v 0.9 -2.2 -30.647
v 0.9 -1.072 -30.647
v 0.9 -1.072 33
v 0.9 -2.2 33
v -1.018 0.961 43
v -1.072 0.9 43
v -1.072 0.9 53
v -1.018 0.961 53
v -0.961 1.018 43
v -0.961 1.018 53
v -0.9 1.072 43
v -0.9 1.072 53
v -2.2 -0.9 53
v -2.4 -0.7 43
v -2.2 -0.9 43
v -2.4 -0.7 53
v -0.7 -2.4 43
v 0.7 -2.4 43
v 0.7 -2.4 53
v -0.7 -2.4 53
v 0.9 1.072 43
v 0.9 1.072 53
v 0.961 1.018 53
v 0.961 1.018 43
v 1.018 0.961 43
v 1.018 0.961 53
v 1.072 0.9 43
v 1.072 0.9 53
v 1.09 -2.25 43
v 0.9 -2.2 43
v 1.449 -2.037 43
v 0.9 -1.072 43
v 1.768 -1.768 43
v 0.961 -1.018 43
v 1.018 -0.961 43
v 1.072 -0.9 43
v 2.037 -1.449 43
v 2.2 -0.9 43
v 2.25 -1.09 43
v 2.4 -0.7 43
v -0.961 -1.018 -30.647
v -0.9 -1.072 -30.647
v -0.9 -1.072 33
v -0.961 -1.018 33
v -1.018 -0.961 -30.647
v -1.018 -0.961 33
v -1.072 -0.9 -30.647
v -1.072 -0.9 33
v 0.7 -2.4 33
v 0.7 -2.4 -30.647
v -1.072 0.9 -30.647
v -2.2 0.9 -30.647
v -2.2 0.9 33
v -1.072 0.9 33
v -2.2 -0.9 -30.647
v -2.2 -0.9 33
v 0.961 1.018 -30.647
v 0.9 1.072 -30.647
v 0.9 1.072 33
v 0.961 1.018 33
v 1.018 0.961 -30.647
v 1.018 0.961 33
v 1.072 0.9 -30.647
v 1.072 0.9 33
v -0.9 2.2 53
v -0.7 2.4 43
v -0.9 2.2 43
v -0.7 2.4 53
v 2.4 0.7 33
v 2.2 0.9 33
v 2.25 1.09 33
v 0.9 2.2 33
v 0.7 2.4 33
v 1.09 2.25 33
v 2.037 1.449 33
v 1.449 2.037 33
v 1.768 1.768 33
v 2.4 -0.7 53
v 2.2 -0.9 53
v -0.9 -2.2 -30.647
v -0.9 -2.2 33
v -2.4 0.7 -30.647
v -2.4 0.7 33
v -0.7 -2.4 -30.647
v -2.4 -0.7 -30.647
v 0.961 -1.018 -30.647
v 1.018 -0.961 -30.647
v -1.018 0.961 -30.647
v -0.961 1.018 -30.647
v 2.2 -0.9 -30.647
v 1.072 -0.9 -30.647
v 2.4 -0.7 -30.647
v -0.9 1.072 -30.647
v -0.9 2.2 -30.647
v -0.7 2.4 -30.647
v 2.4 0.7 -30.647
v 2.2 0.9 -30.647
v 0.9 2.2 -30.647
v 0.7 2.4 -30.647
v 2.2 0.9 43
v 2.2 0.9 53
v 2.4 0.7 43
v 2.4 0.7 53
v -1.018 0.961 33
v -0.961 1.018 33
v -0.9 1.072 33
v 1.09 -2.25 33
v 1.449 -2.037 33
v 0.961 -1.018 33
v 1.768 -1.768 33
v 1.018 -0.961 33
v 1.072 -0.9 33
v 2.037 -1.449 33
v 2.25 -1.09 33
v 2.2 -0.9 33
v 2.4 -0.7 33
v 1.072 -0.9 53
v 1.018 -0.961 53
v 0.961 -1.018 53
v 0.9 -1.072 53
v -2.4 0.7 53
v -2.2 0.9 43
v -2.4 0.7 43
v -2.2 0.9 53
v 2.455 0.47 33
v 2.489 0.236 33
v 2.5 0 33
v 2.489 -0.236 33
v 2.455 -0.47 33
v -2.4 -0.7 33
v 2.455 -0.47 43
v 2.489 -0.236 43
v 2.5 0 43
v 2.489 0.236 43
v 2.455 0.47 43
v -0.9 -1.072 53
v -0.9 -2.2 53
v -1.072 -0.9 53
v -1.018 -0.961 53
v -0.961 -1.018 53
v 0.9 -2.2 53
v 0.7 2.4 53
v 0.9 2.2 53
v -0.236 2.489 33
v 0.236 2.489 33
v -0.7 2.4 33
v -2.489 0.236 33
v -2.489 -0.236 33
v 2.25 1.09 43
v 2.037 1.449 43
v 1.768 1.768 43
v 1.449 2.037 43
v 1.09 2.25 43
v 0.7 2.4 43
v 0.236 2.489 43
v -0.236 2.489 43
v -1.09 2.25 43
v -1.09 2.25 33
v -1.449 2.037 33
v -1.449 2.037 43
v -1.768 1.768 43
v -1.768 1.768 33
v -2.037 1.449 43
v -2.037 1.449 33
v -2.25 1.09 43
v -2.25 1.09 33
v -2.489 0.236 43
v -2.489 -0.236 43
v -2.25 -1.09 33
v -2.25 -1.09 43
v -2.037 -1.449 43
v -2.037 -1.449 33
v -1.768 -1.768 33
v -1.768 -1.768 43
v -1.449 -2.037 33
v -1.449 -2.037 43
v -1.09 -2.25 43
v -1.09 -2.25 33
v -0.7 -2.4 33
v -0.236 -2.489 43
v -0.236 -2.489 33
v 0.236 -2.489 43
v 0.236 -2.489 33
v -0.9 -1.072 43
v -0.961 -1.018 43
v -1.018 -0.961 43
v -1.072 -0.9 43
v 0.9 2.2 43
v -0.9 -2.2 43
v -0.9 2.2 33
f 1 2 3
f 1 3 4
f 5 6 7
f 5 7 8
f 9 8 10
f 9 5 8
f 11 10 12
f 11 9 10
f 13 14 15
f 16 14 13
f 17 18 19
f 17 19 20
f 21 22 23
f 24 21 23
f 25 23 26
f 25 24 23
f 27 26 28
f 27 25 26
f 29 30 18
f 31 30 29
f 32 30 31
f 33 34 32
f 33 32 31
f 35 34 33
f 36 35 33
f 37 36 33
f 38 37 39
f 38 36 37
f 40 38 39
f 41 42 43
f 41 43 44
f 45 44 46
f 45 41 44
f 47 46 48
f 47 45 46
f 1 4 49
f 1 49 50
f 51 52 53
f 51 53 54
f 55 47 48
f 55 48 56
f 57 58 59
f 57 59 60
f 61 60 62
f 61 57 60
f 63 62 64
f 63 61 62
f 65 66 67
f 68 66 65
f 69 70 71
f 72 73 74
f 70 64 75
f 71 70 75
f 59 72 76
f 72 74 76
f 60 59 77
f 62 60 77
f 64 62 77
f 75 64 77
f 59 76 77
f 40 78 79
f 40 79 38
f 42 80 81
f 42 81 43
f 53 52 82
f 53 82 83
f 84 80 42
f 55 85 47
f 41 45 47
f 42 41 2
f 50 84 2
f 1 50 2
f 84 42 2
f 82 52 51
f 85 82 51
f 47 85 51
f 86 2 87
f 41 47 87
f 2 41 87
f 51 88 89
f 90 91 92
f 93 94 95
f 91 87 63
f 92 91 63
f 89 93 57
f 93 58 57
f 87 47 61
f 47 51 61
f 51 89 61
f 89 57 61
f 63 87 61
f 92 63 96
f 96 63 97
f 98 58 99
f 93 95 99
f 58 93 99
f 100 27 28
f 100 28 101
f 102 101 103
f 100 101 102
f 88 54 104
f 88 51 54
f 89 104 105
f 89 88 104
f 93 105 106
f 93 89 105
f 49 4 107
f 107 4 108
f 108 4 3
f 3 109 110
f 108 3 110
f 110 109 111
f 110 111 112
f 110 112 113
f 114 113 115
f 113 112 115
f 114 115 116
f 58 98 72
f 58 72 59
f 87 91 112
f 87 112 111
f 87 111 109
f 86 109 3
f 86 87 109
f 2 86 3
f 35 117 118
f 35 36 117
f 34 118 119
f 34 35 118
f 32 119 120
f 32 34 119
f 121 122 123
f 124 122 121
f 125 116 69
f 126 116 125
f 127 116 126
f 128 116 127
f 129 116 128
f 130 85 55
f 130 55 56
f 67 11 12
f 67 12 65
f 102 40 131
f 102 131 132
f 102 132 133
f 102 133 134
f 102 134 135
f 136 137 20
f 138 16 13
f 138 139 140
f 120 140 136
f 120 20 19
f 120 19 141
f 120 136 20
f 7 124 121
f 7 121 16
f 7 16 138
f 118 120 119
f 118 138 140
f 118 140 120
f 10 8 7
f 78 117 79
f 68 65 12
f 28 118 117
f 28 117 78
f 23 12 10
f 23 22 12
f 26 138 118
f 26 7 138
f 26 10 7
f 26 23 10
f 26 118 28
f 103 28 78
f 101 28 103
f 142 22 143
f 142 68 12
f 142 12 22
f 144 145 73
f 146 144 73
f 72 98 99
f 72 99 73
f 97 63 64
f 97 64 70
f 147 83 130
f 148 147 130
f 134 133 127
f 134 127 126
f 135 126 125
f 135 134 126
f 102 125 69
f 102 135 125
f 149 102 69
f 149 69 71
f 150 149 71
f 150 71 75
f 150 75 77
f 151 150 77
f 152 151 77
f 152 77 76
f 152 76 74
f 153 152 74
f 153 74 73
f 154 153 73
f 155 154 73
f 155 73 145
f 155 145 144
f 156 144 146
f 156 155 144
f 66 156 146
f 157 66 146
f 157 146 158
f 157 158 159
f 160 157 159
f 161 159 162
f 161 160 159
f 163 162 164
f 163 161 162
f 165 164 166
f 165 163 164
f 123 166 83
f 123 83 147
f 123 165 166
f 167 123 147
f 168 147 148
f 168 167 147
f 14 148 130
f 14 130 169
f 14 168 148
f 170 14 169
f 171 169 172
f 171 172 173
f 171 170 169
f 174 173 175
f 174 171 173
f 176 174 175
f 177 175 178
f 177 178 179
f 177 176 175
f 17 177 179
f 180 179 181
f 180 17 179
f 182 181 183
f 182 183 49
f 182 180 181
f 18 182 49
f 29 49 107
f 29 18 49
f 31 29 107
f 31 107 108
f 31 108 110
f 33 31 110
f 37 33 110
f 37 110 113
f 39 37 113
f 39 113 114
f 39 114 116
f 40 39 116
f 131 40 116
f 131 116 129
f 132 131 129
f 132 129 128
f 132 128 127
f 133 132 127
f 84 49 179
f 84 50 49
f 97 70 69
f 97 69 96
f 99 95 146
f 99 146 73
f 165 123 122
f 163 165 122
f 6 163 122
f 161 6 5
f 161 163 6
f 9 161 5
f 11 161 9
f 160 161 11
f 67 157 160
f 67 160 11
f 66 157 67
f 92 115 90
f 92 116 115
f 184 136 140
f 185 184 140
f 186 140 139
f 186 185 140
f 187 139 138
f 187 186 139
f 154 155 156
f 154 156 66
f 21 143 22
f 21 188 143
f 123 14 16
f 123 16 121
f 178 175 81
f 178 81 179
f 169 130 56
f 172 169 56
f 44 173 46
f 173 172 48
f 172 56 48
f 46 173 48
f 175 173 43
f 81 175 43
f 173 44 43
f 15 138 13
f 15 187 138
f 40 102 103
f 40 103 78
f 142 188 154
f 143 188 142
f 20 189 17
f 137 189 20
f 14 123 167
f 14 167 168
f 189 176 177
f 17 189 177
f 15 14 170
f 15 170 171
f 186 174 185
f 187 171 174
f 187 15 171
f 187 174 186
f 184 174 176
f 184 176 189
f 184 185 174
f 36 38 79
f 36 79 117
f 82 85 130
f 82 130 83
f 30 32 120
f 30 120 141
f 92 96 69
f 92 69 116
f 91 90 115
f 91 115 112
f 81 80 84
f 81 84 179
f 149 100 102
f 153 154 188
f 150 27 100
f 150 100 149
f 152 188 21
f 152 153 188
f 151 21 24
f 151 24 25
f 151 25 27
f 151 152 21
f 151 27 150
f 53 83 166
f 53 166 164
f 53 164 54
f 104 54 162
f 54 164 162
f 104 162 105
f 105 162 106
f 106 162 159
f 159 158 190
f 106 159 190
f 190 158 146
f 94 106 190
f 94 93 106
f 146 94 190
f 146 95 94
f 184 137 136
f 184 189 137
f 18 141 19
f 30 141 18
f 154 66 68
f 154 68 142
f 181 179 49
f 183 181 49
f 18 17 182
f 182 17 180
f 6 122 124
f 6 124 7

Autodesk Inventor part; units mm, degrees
ref_plane "YZ Plane" through (0, 0, 0) normal (1, 0, 0) x (0, 1, 0)
ref_plane "Plano de trabajo3" through (-1.1085, 1.0105, -30.6473) normal (0, 0, 1) x (1, 0, 0)
ref_plane "Plano de trabajo4" through (0, 7, 53) normal (0, 0, 1) x (-1, 0, 0)
sketch "Boceto1" plane through (0, 0, 0) normal (0, 0, 1) x (1, 0, 0)
  line L0 (0.9, -2.4) -> (-0.9, -2.4)
  line L1 (-0.9, -2.4) -> (-0.9, 2.4)
  line L2 (-0.9, 2.4) -> (0.9, 2.4)
  line L3 (0.9, 2.4) -> (0.9, -2.4)
  line L4 (0.9, -2.4) -> (-0.9, 2.4) construction
  line L5 (-0.9, -2.4) -> (0.9, 2.4) construction
  line L6 (2.4, -0.9) -> (-2.4, -0.9)
  line L7 (-2.4, -0.9) -> (-2.4, 0.9)
  line L8 (-2.4, 0.9) -> (2.4, 0.9)
  line L9 (2.4, 0.9) -> (2.4, -0.9)
  line L10 (2.4, -0.9) -> (-2.4, 0.9) construction
  line L11 (-2.4, -0.9) -> (2.4, 0.9) construction
  circle A0 centre (0, 0) radius 1.4
  point P0 (1.0724, 0.9)
  point P1 (0.9, 1.0724)
  point P2 (-0.9, 1.0724)
  point P3 (-1.0724, 0.9)
  point P4 (-1.0724, -0.9)
  point P5 (-0.9, -1.0724)
  point P6 (0.9, -1.0724)
  point P7 (1.0724, -0.9)
  dimension "d0" = 1.8
  dimension "d1" = 4.8
  dimension "d2" = 2.8
extrude "Extrusión1" add sketch "Boceto1" along normal up to surface (83.6473 mm away) from surface at -30.6473
chamfer "Chaflán1" distance 0.2 angle 45 8 edges at (0.9, 2.4, 11.1763) (2.4, 0.9, 11.1763) (2.4, -0.9, 11.1763) (0.9, -2.4, 11.1763) (-0.9, 2.4, 11.1763) (-2.4, 0.9, 11.1763) (-2.4, -0.9, 11.1763) (-0.9, -2.4, 11.1763)
sketch "Boceto2" plane through (0, 0, 53) normal (0, 0, 1) x (1, 0, 0)
  circle A0 centre (0, 0) radius 2.5
  dimension "d8" = 5
ref_plane "Plano de trabajo1" through (-15, -5, 43) normal (0, 0, 1) x (1, 0, 0)
ref_plane "Plano de trabajo2" through (-15, -5, 33) normal (0, 0, -1) x (0, 1, 0)
extrude "Extrusión2" add sketch "Boceto2" against normal up to surface (10 mm away) from surface at -10
properties part number "EjeDelMotor"
